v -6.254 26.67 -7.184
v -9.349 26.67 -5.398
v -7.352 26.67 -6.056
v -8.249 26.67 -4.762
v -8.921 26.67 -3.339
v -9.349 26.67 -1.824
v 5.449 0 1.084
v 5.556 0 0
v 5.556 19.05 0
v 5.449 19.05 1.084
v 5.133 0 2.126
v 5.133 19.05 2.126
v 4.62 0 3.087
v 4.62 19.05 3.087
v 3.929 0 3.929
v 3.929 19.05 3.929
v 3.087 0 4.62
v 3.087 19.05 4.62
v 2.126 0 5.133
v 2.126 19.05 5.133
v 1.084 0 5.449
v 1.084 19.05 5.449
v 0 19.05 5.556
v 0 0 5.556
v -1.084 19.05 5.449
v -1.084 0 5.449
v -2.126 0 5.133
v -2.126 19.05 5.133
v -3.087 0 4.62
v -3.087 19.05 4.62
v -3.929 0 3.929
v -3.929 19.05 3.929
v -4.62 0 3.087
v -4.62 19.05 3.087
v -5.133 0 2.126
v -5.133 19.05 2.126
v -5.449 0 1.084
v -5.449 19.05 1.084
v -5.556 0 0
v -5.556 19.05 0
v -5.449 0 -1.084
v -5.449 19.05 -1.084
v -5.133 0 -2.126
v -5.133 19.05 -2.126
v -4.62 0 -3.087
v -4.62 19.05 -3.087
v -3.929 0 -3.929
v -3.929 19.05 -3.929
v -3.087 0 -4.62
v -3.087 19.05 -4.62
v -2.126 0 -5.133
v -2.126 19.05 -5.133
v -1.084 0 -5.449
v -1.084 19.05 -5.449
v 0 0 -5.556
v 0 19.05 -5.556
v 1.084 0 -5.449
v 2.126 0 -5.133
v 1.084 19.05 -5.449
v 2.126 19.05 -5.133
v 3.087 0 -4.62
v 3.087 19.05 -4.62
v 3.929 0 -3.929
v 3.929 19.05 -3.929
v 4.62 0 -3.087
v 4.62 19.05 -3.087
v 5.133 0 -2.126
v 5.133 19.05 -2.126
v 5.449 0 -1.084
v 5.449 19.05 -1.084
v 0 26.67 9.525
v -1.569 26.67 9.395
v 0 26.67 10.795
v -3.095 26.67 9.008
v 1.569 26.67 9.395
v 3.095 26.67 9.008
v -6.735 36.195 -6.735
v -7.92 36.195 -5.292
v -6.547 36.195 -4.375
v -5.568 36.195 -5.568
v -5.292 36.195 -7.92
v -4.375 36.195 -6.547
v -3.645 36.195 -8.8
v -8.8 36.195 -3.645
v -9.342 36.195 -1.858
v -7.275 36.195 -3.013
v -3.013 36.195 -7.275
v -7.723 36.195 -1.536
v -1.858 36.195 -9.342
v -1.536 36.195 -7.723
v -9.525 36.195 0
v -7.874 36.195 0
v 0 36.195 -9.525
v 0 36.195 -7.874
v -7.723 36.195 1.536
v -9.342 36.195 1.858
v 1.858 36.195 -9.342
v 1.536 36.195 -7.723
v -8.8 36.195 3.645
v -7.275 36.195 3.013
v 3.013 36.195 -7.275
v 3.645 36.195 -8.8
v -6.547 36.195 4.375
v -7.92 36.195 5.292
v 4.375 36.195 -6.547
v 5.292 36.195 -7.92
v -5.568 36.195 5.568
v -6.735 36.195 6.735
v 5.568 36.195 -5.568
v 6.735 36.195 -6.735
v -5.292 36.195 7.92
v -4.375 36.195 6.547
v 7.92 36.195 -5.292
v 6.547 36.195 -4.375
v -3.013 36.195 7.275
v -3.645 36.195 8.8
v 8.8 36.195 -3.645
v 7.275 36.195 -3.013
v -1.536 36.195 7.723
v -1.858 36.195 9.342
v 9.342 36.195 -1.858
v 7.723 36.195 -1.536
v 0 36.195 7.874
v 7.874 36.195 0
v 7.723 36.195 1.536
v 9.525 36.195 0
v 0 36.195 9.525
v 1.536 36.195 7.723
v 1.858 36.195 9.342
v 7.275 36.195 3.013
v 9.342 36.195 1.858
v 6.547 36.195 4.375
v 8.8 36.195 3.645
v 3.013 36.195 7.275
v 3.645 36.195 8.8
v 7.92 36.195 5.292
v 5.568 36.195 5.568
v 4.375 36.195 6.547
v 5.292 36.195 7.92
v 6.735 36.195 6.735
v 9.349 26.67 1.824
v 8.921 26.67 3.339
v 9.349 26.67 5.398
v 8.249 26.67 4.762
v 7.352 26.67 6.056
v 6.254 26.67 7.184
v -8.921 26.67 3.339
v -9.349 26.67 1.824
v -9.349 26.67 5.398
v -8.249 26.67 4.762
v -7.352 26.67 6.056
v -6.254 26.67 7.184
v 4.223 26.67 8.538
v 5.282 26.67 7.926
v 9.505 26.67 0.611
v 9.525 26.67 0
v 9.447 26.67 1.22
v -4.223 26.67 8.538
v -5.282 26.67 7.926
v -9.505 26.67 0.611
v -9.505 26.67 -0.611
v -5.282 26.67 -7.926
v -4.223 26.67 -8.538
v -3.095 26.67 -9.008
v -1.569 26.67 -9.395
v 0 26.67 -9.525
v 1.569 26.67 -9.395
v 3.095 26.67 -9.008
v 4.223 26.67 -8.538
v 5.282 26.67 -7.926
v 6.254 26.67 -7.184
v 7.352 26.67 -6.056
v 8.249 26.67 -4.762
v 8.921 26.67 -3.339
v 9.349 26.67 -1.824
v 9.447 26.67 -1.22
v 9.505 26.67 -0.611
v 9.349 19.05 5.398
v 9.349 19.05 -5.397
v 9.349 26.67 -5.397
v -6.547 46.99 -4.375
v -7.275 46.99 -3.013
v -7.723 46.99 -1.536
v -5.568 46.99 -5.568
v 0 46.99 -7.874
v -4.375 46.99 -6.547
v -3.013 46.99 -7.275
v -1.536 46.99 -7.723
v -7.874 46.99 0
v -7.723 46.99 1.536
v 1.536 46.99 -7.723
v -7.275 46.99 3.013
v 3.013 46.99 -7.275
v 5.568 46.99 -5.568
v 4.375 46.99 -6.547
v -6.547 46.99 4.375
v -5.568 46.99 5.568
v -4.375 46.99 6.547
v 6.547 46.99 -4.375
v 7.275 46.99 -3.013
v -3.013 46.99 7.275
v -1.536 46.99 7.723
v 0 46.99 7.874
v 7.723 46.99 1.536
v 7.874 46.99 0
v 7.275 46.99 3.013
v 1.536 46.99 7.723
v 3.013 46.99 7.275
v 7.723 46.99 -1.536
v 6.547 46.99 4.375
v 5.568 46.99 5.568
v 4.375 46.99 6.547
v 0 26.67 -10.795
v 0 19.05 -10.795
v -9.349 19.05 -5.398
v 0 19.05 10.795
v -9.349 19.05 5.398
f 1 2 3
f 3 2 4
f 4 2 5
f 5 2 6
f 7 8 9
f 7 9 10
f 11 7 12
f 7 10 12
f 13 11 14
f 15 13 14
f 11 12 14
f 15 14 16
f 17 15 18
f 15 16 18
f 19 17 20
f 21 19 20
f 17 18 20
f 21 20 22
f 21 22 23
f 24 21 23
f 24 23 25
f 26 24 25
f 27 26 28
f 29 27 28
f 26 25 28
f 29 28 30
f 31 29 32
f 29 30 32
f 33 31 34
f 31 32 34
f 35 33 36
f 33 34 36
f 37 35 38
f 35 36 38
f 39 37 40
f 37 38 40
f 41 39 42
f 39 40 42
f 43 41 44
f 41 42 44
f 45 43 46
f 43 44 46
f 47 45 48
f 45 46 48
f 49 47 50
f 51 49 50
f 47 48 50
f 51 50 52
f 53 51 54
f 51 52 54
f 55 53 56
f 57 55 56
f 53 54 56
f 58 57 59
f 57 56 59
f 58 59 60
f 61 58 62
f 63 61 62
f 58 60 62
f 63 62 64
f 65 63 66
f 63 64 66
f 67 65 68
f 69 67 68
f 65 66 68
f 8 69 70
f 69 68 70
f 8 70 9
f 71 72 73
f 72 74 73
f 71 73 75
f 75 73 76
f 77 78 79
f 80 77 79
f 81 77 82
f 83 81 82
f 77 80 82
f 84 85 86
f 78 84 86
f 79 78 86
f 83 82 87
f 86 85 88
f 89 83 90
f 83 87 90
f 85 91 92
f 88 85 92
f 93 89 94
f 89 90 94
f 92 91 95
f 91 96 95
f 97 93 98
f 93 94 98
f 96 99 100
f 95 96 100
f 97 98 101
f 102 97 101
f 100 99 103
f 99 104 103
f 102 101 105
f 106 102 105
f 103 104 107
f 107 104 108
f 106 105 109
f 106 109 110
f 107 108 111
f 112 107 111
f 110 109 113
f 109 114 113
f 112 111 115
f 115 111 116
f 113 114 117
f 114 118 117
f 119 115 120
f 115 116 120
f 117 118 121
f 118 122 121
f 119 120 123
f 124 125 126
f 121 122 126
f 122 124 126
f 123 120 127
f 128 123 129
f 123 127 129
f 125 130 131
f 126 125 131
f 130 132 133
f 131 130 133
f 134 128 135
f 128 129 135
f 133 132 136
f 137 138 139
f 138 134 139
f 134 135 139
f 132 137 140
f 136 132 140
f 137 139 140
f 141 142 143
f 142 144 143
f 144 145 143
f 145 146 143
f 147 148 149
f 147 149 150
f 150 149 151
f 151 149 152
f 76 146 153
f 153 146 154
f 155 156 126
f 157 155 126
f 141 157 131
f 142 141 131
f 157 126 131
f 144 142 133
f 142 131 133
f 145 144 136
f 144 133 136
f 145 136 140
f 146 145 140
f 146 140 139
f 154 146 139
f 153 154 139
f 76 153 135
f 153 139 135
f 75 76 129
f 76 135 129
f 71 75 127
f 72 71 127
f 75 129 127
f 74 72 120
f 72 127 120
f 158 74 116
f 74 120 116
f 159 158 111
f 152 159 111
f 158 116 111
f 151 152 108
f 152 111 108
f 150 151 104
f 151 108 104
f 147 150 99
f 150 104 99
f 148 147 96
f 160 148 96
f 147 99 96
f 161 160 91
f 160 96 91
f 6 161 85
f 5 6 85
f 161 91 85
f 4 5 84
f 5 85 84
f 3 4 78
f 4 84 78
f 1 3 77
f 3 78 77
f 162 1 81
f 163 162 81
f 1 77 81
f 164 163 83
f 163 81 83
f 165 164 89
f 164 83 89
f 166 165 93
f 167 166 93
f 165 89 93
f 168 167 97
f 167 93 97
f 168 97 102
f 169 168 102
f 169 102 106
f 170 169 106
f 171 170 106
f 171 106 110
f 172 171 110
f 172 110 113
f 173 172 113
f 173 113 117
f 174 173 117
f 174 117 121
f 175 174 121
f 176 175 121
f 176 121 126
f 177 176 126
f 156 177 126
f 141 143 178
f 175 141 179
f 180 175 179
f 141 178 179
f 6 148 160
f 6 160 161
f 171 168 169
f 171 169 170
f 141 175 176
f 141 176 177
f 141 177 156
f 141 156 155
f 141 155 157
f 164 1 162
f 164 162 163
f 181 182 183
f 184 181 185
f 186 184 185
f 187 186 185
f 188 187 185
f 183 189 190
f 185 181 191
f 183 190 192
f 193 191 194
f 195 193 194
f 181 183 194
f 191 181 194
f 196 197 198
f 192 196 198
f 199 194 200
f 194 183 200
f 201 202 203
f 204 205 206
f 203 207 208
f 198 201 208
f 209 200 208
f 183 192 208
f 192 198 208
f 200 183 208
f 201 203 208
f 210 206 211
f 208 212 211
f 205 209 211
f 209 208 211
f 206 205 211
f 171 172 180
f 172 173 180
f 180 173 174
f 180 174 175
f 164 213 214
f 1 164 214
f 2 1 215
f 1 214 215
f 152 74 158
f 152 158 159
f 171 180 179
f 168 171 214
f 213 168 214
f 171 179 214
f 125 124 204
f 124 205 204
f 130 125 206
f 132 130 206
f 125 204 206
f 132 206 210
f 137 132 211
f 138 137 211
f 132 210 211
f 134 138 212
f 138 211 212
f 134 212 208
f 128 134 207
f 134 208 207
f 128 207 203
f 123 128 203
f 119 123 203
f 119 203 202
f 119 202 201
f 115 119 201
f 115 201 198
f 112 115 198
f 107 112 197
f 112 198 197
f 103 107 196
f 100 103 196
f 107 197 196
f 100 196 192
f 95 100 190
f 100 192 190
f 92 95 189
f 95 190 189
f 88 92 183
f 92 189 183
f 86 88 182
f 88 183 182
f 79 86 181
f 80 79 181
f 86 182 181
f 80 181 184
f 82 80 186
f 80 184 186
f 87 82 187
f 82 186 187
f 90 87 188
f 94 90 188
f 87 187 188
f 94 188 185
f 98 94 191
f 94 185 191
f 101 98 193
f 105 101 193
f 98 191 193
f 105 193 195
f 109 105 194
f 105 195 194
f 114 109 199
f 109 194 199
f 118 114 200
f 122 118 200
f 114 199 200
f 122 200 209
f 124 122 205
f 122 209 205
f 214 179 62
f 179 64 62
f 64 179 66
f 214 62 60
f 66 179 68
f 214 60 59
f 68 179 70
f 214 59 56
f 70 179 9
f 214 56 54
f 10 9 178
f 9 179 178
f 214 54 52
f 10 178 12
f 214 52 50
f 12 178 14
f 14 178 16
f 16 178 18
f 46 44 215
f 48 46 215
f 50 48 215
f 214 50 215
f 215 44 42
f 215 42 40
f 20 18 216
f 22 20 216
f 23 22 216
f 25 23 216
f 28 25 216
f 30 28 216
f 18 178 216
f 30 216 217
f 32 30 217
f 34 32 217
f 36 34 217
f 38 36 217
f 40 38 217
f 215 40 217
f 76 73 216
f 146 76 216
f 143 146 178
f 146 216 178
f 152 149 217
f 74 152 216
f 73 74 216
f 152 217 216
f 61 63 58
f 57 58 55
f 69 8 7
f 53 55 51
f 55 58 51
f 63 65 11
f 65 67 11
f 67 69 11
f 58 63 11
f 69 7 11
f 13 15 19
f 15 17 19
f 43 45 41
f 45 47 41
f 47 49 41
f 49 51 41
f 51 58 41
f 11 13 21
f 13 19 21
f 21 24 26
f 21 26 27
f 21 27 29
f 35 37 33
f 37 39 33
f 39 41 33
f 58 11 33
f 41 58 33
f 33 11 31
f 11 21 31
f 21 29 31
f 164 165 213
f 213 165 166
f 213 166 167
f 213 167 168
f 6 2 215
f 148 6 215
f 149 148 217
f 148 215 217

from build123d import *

# Parameters (mm, degrees)
CUT_EXTRUDE1_DEPTH = 7.62


with BuildPart() as part:
    # Sketch1 → Revolve1 (revolve)
    with BuildSketch(Plane.XY):
        Polygon((0, 0), (5.55625, 0), (5.55625, 19.05), (10.795, 19.05), (10.795, 26.67), (9.525, 26.67), (9.525, 36.195), (7.874, 36.195), (7.874, 46.99), (0, 46.99), align=None)
    revolve(axis=Axis((0, 46.99, 0), (0, -1, 0)))

    # Sketch2 → Cut-Extrude1 (cut)
    with BuildSketch(Plane.XZ.offset(-19.05)):
        with BuildLine():
            Line((-9.348744234, 5.3975), (0, 10.795))
            ThreePointArc((0, 10.795), (-5.3975, 9.348744234), (-9.348744234, 5.3975))
        make_face()
        with BuildLine():
            ThreePointArc((9.348744234, 5.3975), (5.3975, 9.348744234), (0, 10.795))
            Line((0, 10.795), (9.348744234, 5.3975))
        make_face()
        with BuildLine():
            ThreePointArc((10.795, 0), (10.427169295, 2.793951592), (9.348744234, 5.3975))
            Line((9.348744234, 5.3975), (9.348744234, -5.3975))
            ThreePointArc((9.348744234, -5.3975), (10.427169295, -2.793951592), (10.795, 0))
        make_face()
        with BuildLine():
            ThreePointArc((0, -10.795), (5.3975, -9.348744234), (9.348744234, -5.3975))
            Line((9.348744234, -5.3975), (0, -10.795))
        make_face()
        with BuildLine():
            Line((0, -10.795), (-9.348744234, -5.3975))
            ThreePointArc((-9.348744234, -5.3975), (-5.3975, -9.348744234), (0, -10.795))
        make_face()
        with BuildLine():
            Line((-9.348744234, -5.3975), (-9.348744234, 5.3975))
            ThreePointArc((-9.348744234, 5.3975), (-10.795, 0), (-9.348744234, -5.3975))
        make_face()
    extrude(amount=-CUT_EXTRUDE1_DEPTH, mode=Mode.SUBTRACT)


solid = part.part
